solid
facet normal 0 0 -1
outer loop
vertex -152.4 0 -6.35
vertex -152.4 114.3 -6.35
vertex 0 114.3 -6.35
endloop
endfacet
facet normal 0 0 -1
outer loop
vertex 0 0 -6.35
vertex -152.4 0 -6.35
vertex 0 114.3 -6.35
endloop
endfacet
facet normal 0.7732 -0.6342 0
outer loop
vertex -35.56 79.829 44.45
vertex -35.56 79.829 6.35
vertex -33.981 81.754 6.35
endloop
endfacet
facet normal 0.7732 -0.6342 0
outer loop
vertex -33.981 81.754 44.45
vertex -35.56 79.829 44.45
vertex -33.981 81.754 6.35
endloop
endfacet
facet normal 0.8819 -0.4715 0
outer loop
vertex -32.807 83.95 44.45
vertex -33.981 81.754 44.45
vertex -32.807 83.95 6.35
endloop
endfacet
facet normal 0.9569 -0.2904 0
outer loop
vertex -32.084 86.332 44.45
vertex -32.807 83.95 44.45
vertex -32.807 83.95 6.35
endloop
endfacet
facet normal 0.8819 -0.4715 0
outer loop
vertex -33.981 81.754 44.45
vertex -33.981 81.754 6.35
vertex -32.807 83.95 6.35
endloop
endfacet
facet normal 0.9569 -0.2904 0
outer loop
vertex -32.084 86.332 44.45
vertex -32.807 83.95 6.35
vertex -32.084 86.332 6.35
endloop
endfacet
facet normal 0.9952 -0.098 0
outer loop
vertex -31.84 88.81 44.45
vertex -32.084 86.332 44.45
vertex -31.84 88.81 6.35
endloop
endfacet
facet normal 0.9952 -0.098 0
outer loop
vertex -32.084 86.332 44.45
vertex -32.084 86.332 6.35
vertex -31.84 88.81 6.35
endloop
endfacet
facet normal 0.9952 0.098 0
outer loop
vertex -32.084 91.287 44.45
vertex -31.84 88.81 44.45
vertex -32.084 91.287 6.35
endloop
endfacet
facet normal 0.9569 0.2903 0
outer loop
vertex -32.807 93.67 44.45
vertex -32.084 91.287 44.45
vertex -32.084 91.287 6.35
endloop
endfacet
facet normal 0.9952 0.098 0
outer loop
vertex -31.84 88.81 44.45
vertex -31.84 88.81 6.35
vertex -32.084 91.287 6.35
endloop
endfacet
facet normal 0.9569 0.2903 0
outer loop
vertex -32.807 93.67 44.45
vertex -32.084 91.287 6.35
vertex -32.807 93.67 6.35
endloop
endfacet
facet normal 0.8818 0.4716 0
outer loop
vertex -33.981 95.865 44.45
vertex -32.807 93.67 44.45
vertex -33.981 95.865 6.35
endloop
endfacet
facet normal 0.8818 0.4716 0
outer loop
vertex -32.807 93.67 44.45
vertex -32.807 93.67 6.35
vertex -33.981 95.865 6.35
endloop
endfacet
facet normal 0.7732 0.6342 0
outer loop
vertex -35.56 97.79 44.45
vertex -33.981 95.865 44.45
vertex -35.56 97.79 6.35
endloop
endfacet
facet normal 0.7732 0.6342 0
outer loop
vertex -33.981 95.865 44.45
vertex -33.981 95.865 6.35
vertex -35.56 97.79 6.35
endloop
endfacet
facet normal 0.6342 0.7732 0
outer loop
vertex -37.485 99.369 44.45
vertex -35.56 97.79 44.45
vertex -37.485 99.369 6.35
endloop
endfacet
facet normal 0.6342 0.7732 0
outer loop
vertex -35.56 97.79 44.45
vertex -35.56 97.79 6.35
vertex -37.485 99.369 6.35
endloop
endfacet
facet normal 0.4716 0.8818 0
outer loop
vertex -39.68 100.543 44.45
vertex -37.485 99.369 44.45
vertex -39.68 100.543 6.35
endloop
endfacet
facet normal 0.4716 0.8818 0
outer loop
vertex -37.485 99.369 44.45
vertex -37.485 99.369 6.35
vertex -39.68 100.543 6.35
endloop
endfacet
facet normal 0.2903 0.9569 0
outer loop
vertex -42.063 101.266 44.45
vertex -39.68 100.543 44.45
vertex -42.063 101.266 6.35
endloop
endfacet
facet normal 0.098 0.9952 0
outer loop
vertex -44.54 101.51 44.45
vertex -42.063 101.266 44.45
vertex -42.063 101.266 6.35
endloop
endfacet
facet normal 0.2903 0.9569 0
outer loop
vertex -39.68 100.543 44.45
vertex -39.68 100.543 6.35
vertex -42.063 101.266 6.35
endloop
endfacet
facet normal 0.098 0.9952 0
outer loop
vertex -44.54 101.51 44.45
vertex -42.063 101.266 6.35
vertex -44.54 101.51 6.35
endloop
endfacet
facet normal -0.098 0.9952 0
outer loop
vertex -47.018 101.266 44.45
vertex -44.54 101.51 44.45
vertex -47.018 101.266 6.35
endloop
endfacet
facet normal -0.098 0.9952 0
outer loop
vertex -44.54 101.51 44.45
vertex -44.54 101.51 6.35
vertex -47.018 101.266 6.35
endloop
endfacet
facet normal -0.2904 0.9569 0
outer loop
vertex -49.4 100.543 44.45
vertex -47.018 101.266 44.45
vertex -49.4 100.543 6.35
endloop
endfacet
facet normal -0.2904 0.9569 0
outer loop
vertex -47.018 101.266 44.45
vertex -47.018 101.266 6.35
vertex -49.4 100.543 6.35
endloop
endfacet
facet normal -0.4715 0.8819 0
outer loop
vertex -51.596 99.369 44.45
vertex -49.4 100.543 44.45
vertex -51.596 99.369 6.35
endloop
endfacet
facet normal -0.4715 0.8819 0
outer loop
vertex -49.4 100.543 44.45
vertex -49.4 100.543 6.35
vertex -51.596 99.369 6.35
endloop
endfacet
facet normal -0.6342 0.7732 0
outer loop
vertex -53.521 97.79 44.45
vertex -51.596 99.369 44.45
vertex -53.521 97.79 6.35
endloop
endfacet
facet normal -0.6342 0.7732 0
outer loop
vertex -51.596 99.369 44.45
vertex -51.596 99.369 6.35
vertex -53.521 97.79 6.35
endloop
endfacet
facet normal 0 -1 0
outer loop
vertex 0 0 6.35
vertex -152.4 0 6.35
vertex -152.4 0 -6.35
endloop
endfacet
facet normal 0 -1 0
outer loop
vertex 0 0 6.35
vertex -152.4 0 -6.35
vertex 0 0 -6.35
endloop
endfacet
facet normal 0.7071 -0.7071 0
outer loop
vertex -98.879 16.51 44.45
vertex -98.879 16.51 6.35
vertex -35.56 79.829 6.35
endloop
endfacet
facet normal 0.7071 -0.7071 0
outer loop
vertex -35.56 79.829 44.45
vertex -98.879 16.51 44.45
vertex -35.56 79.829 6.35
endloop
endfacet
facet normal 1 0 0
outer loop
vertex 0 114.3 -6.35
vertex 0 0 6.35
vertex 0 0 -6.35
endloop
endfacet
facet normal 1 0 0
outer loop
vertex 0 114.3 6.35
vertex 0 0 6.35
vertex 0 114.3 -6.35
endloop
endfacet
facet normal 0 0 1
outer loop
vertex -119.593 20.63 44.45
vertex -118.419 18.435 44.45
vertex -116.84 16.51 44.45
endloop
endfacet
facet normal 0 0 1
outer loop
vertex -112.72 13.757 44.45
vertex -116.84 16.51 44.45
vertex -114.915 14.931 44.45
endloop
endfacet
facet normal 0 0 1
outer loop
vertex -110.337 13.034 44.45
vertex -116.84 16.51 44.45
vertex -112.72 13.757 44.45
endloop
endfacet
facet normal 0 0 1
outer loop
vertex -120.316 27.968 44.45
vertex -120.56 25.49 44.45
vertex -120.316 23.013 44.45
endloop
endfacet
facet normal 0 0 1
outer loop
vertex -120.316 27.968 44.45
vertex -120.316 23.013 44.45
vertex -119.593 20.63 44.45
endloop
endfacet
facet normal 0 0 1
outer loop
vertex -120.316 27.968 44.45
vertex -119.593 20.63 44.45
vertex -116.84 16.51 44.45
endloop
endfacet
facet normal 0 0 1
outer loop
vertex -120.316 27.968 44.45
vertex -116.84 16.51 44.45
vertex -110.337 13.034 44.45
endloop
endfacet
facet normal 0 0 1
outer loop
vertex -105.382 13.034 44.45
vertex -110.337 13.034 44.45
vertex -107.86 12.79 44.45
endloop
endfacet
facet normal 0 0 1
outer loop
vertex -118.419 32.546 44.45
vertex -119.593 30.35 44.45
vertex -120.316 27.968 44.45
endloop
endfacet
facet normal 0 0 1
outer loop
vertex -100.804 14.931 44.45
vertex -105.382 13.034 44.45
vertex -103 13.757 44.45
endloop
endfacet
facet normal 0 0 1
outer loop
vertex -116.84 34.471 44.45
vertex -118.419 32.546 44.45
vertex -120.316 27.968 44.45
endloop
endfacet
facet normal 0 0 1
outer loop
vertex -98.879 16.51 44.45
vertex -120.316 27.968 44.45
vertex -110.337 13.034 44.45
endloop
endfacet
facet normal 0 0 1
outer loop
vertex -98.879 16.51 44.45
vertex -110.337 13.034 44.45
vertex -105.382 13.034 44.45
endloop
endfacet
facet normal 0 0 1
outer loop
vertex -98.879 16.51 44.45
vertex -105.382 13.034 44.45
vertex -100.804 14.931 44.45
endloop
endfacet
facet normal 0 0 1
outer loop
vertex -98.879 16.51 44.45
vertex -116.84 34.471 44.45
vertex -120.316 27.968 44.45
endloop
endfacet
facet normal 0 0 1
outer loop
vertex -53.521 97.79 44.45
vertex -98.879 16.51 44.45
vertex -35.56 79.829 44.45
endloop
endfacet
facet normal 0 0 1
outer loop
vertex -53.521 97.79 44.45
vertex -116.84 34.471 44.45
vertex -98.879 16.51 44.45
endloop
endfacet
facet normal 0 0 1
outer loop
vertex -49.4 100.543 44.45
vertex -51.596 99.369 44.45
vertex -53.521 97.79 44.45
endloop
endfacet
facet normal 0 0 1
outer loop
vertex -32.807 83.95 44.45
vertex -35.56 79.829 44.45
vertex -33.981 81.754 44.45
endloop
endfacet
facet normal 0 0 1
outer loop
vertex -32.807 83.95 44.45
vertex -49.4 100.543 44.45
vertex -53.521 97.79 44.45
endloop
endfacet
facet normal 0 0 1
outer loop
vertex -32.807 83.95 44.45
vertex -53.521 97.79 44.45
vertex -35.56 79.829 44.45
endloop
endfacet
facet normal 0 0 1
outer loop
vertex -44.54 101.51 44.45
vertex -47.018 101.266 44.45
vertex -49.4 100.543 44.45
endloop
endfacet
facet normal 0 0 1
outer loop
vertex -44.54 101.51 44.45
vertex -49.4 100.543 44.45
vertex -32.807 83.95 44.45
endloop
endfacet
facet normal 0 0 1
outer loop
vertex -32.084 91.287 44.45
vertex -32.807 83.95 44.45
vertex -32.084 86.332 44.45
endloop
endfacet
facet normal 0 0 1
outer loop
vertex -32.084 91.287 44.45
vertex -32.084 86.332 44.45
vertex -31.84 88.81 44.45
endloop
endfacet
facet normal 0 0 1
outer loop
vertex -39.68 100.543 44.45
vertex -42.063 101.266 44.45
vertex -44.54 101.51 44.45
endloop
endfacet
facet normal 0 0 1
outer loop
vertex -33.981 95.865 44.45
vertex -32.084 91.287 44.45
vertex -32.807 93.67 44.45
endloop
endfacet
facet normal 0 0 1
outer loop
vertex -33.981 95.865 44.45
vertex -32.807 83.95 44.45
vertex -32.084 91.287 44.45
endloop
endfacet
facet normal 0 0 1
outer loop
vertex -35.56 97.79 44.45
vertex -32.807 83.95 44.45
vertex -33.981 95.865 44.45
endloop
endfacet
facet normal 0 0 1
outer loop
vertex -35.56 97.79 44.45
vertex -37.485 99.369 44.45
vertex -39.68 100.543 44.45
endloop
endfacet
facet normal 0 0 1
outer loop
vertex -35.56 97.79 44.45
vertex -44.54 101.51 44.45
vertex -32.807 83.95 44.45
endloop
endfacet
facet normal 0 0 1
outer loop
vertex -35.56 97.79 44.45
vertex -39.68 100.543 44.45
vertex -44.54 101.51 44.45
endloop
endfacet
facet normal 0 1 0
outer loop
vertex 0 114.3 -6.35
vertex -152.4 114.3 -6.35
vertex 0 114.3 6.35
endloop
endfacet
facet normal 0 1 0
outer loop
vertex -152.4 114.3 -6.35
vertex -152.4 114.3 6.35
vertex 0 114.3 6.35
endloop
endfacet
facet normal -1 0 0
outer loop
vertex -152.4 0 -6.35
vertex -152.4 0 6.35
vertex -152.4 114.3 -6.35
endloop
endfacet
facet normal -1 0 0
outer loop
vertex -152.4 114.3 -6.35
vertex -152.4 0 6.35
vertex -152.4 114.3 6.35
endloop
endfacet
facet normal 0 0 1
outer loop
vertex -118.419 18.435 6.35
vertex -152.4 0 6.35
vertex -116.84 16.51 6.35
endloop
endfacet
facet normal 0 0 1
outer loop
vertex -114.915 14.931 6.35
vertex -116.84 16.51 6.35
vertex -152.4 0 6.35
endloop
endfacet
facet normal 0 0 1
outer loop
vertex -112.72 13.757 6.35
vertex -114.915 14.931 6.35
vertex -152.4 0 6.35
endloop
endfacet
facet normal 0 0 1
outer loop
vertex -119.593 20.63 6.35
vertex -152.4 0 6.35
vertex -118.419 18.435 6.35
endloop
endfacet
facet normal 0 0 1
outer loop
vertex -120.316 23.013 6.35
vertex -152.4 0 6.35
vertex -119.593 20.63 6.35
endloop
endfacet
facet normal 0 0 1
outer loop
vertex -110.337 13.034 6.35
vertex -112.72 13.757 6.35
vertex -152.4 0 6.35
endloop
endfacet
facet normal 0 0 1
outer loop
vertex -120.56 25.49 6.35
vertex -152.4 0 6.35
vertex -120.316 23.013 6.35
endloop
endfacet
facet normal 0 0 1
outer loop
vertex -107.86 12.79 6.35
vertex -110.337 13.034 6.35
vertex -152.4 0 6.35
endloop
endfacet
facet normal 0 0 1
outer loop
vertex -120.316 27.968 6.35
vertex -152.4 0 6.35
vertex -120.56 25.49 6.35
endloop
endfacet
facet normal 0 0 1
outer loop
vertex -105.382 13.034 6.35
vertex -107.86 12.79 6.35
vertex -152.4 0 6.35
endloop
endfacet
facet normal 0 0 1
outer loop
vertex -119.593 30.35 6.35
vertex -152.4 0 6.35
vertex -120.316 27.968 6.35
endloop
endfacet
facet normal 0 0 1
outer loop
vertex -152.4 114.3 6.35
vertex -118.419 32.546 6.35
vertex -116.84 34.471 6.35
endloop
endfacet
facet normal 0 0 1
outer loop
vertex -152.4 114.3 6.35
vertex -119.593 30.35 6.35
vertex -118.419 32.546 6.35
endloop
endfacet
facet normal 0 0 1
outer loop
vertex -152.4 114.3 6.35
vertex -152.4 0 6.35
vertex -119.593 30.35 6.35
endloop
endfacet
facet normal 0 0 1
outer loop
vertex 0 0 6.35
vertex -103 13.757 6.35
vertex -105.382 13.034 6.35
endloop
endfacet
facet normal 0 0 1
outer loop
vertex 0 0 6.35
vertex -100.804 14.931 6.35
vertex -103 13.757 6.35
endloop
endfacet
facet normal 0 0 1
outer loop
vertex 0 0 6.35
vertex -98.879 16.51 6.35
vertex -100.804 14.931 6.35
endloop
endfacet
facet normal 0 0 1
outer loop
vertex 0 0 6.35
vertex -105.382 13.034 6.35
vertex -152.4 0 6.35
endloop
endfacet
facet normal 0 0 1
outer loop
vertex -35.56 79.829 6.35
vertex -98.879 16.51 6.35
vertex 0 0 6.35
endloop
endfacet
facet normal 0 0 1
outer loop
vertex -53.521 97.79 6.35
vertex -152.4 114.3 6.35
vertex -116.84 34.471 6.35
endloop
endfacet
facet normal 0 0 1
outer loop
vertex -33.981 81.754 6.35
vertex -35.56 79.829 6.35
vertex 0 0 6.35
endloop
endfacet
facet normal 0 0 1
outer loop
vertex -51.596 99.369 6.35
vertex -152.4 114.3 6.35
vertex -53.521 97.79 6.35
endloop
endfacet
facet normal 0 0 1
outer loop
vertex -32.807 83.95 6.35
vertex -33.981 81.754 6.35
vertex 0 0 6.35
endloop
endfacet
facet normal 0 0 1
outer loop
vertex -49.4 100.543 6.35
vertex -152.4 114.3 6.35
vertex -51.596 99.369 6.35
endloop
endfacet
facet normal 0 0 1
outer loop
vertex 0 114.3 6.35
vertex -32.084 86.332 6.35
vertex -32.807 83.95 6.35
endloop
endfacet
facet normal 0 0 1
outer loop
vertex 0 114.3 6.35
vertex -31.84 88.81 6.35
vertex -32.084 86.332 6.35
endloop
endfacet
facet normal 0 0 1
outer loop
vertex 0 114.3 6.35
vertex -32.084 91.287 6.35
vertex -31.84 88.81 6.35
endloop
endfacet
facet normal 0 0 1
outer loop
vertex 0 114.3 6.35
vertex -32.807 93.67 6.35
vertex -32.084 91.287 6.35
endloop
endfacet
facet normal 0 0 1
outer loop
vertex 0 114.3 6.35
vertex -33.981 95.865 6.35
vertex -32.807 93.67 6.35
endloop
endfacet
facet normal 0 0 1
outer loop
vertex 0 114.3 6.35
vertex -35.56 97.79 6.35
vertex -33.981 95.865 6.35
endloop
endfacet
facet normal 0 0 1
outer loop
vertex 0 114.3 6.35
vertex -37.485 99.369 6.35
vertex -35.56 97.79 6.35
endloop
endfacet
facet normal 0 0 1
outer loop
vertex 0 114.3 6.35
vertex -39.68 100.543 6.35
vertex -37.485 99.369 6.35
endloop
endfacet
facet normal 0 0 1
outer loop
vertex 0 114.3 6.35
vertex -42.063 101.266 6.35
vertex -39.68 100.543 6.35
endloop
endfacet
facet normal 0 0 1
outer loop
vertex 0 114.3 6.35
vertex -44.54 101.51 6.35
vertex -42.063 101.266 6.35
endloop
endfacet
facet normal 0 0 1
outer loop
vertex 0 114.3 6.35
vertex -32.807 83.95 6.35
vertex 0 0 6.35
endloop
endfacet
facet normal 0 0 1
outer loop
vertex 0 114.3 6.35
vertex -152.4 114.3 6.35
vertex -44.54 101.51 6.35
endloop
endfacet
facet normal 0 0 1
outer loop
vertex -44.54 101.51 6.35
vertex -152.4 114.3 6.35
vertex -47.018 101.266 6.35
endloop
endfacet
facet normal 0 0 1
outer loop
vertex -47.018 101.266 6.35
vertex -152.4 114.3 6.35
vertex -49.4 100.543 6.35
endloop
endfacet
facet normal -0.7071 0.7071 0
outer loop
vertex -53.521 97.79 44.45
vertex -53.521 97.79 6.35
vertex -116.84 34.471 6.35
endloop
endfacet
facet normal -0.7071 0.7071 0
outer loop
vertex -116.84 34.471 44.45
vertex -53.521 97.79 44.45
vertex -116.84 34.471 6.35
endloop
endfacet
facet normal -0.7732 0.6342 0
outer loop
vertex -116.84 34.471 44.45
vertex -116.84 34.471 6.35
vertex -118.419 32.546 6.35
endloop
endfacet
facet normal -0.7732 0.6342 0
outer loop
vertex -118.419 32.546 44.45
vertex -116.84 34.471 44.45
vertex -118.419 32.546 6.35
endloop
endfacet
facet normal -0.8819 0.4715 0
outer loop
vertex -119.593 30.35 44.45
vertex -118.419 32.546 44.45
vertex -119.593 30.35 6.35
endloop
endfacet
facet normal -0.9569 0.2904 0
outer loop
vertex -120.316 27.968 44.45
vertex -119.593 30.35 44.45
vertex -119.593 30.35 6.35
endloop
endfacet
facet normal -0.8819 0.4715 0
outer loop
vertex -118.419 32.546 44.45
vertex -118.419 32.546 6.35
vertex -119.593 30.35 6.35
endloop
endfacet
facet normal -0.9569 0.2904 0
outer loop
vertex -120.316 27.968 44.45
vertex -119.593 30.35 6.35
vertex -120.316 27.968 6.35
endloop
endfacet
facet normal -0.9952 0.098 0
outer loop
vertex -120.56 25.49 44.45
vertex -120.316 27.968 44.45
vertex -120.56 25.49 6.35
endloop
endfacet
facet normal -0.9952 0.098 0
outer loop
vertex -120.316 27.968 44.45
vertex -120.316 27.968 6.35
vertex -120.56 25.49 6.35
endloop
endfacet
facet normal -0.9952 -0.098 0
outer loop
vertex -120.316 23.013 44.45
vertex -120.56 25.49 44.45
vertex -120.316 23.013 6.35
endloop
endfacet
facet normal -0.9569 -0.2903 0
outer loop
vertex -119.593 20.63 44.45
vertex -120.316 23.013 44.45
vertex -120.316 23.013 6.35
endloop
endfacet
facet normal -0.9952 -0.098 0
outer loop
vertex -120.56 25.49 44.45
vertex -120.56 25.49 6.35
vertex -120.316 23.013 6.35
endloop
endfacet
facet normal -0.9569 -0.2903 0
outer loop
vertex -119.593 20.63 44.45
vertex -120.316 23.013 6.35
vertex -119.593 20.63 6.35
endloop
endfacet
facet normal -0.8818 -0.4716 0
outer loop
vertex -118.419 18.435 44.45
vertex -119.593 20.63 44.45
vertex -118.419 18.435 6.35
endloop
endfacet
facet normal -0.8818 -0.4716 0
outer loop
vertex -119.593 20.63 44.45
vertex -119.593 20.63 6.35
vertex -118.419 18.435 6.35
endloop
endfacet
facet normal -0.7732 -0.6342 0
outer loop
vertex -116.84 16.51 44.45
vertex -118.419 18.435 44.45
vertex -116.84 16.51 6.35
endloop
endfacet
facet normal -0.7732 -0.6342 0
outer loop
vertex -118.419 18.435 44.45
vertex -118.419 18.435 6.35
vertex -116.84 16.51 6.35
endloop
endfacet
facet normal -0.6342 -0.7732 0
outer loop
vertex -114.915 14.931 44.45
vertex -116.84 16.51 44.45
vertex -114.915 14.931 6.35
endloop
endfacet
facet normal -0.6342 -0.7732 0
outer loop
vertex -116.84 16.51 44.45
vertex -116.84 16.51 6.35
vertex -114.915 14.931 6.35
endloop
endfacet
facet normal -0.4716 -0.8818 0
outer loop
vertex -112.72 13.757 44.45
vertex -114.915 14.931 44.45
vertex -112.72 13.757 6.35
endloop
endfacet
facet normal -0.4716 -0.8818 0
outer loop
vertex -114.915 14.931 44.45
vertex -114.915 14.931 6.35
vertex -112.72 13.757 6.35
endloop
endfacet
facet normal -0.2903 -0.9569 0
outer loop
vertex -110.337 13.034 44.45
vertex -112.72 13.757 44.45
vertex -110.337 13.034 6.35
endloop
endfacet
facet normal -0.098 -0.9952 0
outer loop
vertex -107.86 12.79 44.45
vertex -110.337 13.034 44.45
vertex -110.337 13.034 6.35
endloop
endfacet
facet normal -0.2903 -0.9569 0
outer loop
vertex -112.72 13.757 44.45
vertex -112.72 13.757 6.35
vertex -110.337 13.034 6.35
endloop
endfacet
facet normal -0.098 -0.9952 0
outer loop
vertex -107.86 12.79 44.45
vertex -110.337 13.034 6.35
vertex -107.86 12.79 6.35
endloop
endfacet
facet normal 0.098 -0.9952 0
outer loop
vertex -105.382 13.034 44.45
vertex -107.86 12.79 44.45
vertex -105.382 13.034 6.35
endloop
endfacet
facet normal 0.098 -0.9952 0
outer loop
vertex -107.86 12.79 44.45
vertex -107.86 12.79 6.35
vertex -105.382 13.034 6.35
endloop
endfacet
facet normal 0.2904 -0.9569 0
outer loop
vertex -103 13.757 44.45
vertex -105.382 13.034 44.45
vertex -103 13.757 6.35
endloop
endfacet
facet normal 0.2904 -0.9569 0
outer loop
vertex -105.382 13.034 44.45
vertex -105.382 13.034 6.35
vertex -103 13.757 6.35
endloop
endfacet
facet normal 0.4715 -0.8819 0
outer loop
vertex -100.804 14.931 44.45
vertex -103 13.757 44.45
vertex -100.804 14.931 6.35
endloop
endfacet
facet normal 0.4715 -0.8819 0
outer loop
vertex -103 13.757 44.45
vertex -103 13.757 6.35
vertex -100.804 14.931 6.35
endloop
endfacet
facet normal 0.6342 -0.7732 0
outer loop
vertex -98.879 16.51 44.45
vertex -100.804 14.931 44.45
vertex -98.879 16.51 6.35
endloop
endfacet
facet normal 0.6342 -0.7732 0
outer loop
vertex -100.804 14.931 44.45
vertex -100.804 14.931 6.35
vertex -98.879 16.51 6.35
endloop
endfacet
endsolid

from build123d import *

# Parameters (mm, degrees)
F0_W     = 152.4
F0_H     = 114.3
F1_DEPTH = 6.35
F3_DEPTH = 38.1


with BuildPart() as f1:
    # F0 (on Top) → F1 (new body, symmetric)
    with BuildSketch(Plane.XY):
        with Locations((-76.2, 57.15)):
            Rectangle(F0_W, F0_H)
    extrude(amount=F1_DEPTH, both=True)

    # F2 (on face) → F3 (join)
    with BuildSketch(Plane.XY.offset(6.35)):
        Polygon((-53.5205122421, 97.79), (-116.84, 34.4705122421), (-107.8597438789, 25.4902561211), (-98.8794877579, 16.51), (-35.56, 79.8294877579), (-44.5402561211, 88.8097438789), align=None)
        with BuildLine():
            Line((-107.8597438789, 25.4902561211), (-116.84, 34.4705122421))
            ThreePointArc((-116.84, 34.4705122421), (-116.84, 16.51), (-98.8794877579, 16.51))
            Line((-98.8794877579, 16.51), (-107.8597438789, 25.4902561211))
        make_face()
        with BuildLine():
            ThreePointArc((-35.56, 79.8294877579), (-35.56, 97.79), (-53.5205122421, 97.79))
            Line((-53.5205122421, 97.79), (-44.5402561211, 88.8097438789))
            Line((-44.5402561211, 88.8097438789), (-35.56, 79.8294877579))
        make_face()
    extrude(amount=F3_DEPTH)


solid = f1.part
